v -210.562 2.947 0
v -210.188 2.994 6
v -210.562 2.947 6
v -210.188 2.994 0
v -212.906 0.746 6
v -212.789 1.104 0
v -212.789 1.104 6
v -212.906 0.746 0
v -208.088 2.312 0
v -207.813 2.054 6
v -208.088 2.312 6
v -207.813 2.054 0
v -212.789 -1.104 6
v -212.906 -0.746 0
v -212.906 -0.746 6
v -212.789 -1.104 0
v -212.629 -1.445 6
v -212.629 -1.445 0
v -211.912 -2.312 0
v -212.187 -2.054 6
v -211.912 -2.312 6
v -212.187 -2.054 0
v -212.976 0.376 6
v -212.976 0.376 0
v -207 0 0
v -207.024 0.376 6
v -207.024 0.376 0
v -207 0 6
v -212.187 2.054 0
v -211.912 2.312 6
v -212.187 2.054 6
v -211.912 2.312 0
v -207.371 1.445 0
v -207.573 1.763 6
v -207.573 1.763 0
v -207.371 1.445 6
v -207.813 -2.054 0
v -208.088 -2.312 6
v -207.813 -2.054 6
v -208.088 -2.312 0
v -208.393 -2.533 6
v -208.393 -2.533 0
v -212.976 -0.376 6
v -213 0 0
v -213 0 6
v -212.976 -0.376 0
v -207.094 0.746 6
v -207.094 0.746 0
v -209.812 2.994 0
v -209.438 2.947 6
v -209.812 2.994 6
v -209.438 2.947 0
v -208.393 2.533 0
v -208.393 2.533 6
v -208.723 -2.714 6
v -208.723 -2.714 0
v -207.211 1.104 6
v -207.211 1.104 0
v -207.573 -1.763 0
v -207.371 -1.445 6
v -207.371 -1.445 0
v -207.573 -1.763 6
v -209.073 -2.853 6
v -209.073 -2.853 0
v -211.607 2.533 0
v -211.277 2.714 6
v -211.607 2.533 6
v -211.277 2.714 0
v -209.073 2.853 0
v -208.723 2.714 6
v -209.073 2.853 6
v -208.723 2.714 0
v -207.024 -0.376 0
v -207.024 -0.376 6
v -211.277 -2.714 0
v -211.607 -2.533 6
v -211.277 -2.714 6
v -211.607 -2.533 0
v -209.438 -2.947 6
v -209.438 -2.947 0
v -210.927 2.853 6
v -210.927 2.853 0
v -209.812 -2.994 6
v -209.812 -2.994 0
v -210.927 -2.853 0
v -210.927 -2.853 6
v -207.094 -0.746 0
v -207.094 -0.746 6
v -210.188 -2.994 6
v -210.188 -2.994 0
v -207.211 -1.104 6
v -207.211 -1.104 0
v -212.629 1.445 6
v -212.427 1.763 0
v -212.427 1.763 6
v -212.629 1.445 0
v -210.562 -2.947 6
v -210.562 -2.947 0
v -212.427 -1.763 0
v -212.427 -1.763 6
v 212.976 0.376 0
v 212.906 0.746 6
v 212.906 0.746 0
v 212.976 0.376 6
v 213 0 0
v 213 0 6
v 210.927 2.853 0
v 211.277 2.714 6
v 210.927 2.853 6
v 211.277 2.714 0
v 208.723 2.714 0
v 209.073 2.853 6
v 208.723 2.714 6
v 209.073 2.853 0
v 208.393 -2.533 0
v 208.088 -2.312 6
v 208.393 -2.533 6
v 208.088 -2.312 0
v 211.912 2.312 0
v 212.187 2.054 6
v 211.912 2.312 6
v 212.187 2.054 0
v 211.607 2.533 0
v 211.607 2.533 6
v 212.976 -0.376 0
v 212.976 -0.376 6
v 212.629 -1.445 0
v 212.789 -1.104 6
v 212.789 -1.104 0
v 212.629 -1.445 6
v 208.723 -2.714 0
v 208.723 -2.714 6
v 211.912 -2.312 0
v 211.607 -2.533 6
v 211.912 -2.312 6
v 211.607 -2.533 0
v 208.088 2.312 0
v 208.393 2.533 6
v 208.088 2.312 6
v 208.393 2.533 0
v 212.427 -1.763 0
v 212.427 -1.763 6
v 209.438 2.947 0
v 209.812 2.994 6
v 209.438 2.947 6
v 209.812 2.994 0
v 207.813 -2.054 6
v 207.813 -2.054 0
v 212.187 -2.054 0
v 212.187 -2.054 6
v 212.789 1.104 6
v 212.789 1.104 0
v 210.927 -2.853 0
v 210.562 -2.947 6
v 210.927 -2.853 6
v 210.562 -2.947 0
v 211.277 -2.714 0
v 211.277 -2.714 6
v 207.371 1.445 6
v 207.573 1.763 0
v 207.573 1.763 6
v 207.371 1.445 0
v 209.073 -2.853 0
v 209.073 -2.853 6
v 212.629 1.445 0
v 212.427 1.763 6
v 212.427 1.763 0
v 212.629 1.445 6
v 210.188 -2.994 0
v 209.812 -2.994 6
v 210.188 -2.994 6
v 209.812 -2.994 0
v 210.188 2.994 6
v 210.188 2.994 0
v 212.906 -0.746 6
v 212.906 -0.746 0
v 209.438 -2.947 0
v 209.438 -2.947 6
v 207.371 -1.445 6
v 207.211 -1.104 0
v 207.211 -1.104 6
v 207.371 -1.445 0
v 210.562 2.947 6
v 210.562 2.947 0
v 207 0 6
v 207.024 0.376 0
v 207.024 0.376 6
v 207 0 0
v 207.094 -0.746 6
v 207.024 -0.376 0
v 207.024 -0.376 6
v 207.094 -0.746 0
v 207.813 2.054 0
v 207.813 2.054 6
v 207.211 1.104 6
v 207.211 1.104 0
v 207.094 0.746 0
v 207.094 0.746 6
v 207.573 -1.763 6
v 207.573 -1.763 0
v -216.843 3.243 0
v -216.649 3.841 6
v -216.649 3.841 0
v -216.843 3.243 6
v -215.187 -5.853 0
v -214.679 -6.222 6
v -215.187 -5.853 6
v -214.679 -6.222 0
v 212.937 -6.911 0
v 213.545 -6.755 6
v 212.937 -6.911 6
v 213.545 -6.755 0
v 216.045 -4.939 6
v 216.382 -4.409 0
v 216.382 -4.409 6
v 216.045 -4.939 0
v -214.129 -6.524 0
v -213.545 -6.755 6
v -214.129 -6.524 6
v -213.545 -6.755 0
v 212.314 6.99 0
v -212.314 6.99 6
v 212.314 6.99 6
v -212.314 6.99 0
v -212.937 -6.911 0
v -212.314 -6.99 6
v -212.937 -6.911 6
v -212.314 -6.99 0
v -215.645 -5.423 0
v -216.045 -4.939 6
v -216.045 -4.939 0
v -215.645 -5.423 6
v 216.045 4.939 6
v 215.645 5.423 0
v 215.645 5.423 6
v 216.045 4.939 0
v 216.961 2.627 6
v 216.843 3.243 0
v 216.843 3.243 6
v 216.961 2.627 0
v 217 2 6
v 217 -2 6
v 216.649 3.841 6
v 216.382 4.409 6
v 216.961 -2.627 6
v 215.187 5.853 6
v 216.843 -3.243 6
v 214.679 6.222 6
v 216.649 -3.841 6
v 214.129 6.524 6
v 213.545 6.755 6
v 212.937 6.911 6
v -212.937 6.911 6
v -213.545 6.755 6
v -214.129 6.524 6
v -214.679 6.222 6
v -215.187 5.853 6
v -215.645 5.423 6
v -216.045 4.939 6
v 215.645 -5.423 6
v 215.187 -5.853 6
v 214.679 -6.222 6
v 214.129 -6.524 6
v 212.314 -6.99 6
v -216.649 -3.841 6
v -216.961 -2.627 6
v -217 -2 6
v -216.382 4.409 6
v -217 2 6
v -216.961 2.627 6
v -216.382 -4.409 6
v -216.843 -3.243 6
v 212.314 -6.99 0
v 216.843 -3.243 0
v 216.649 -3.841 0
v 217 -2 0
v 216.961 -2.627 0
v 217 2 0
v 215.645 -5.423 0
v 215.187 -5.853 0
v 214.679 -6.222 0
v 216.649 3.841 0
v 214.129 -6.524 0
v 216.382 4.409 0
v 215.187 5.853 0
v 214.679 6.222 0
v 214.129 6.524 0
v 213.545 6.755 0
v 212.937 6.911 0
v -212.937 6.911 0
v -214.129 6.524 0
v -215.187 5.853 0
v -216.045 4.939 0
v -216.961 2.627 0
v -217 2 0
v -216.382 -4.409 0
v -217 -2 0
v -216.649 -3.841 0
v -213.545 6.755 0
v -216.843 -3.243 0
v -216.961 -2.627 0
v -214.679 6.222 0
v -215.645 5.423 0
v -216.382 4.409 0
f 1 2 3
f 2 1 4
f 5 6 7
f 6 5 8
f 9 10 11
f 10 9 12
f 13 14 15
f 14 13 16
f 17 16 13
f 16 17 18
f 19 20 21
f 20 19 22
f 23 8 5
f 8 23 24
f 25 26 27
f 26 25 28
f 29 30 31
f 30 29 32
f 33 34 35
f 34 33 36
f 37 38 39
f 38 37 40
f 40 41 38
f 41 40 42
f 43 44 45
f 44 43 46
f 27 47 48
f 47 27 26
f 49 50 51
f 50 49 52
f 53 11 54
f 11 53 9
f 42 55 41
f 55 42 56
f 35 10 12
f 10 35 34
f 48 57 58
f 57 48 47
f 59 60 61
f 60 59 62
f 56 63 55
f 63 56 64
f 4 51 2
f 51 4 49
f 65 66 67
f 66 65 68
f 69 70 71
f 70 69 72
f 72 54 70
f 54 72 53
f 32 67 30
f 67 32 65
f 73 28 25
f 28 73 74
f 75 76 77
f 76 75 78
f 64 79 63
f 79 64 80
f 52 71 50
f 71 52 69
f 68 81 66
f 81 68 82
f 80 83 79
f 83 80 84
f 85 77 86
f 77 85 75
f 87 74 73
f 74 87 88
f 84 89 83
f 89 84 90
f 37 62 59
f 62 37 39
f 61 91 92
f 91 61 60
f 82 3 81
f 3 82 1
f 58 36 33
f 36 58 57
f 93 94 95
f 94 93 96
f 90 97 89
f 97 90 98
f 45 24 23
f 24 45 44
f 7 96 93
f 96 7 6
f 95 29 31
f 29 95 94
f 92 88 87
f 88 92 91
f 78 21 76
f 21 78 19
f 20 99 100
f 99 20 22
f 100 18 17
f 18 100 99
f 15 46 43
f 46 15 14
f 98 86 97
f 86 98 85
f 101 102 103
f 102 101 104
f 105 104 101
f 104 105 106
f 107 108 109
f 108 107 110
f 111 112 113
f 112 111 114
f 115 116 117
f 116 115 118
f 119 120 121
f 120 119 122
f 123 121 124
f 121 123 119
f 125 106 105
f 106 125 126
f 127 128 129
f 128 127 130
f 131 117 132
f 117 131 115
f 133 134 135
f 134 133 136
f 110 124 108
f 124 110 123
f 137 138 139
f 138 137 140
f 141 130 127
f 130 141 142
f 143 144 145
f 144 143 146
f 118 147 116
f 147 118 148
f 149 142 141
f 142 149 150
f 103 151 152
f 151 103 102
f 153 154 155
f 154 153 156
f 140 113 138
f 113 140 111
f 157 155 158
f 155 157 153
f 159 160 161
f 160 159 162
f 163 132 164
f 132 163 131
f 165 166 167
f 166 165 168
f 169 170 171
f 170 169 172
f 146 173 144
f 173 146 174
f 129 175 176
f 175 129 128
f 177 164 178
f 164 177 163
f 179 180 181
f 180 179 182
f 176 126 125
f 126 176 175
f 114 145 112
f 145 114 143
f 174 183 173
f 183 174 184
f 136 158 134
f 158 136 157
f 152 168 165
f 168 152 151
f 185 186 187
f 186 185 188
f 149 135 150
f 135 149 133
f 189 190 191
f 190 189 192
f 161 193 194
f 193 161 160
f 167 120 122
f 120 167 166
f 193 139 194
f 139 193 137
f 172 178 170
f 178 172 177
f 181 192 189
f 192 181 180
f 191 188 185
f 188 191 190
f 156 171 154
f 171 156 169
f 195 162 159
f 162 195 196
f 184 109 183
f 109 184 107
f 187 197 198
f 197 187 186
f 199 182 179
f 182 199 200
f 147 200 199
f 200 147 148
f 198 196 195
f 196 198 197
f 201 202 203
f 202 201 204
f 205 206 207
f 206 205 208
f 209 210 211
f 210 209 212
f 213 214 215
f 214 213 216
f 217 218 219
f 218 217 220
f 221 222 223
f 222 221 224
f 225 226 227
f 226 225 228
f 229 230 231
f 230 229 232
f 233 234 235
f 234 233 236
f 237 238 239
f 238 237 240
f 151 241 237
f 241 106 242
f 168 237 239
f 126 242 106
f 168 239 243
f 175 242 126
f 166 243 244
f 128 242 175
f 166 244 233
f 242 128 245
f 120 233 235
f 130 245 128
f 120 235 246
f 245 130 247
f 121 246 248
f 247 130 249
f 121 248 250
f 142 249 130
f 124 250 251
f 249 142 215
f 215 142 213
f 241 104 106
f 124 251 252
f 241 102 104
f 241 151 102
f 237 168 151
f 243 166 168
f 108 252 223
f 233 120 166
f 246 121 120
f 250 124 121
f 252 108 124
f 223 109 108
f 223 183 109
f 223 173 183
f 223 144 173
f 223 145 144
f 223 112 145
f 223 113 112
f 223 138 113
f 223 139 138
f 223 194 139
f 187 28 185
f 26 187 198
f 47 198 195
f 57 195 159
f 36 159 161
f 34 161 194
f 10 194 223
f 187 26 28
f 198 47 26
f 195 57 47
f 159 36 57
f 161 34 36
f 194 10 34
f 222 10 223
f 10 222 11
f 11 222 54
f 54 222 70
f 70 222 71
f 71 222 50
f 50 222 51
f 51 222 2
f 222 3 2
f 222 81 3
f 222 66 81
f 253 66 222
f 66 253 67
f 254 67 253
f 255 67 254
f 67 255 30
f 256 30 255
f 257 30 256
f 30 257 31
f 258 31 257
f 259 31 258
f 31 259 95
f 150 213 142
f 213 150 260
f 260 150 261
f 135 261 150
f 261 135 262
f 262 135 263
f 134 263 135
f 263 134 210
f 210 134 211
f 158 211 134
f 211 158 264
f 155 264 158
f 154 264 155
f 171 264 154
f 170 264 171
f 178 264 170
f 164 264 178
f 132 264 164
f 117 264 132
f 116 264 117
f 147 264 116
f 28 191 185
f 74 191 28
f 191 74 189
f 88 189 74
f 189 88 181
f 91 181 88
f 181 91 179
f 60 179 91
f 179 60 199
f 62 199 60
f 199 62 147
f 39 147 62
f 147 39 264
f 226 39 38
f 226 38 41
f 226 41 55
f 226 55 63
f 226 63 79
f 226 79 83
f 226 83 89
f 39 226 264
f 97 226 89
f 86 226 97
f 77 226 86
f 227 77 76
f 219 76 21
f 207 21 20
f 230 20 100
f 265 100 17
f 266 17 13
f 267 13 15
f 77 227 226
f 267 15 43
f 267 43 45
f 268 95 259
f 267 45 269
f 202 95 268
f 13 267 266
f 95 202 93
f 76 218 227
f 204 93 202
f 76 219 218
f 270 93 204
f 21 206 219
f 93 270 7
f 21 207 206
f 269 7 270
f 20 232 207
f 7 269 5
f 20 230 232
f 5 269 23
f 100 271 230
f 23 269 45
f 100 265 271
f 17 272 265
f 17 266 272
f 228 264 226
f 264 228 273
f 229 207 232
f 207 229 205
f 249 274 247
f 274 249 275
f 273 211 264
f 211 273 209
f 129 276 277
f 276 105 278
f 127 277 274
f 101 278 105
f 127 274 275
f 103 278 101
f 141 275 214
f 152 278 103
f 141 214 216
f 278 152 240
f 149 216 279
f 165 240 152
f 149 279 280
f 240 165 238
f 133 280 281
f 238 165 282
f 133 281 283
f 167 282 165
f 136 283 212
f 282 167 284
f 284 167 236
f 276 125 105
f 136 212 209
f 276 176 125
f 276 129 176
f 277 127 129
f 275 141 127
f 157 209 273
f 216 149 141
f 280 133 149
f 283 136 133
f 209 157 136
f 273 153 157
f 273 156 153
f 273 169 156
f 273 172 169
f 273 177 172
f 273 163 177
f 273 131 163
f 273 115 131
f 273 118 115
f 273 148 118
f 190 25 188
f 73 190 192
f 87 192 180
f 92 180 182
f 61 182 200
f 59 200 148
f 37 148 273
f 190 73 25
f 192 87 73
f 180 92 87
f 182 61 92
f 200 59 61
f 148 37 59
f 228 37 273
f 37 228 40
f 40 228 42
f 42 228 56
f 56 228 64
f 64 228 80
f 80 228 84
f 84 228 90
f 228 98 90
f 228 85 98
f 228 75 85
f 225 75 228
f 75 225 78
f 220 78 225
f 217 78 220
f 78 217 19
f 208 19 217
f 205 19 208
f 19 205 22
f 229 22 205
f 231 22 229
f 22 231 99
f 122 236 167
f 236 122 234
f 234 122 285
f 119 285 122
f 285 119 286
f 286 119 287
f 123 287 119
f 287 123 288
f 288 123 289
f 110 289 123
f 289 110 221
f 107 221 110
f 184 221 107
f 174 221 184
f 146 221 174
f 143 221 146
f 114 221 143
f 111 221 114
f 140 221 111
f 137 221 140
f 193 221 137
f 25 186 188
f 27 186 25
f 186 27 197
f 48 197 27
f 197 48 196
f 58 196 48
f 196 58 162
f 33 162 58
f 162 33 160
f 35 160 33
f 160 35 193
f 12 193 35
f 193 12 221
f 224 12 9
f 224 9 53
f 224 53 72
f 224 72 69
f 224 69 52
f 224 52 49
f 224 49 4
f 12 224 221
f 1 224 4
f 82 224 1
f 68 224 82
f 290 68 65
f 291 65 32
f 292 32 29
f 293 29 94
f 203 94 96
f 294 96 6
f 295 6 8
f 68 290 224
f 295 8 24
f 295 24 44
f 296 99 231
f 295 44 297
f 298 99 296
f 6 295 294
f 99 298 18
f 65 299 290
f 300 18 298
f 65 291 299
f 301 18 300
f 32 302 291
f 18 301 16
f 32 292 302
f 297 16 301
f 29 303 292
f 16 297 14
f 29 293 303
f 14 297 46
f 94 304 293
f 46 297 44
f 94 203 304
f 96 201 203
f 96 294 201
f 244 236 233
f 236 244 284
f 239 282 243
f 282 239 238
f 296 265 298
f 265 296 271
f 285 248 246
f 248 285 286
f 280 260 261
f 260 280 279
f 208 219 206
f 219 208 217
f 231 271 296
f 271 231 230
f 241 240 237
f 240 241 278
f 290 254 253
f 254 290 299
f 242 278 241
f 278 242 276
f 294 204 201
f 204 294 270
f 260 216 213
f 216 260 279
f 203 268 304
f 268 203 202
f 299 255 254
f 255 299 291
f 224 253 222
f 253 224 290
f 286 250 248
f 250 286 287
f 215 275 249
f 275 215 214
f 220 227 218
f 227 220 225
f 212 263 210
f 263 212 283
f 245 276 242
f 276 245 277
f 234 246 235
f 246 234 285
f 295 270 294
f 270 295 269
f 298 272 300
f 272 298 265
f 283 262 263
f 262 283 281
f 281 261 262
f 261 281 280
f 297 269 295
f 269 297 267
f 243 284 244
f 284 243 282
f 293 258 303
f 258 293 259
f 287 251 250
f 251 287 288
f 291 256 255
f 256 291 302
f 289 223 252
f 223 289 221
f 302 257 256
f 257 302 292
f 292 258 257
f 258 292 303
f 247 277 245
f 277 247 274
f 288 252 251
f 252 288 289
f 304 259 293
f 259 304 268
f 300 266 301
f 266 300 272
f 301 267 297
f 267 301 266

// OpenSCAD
$fn = 50;


difference() {
	union() {
		hull() {
			translate(v = [-212.0000000000, 2.0000000000, 0]) {
				cylinder(h = 6, r = 5);
			}
			translate(v = [212.0000000000, 2.0000000000, 0]) {
				cylinder(h = 6, r = 5);
			}
			translate(v = [-212.0000000000, -2.0000000000, 0]) {
				cylinder(h = 6, r = 5);
			}
			translate(v = [212.0000000000, -2.0000000000, 0]) {
				cylinder(h = 6, r = 5);
			}
		}
	}
	union() {
		translate(v = [-210.0000000000, 0.0000000000, -100.0000000000]) {
			cylinder(h = 200, r = 3.0000000000);
		}
		translate(v = [-210.0000000000, 0.0000000000, -100.0000000000]) {
			cylinder(h = 200, r = 3.0000000000);
		}
		translate(v = [210.0000000000, 0.0000000000, -100.0000000000]) {
			cylinder(h = 200, r = 3.0000000000);
		}
		translate(v = [210.0000000000, 0.0000000000, -100.0000000000]) {
			cylinder(h = 200, r = 3.0000000000);
		}
	}
}
